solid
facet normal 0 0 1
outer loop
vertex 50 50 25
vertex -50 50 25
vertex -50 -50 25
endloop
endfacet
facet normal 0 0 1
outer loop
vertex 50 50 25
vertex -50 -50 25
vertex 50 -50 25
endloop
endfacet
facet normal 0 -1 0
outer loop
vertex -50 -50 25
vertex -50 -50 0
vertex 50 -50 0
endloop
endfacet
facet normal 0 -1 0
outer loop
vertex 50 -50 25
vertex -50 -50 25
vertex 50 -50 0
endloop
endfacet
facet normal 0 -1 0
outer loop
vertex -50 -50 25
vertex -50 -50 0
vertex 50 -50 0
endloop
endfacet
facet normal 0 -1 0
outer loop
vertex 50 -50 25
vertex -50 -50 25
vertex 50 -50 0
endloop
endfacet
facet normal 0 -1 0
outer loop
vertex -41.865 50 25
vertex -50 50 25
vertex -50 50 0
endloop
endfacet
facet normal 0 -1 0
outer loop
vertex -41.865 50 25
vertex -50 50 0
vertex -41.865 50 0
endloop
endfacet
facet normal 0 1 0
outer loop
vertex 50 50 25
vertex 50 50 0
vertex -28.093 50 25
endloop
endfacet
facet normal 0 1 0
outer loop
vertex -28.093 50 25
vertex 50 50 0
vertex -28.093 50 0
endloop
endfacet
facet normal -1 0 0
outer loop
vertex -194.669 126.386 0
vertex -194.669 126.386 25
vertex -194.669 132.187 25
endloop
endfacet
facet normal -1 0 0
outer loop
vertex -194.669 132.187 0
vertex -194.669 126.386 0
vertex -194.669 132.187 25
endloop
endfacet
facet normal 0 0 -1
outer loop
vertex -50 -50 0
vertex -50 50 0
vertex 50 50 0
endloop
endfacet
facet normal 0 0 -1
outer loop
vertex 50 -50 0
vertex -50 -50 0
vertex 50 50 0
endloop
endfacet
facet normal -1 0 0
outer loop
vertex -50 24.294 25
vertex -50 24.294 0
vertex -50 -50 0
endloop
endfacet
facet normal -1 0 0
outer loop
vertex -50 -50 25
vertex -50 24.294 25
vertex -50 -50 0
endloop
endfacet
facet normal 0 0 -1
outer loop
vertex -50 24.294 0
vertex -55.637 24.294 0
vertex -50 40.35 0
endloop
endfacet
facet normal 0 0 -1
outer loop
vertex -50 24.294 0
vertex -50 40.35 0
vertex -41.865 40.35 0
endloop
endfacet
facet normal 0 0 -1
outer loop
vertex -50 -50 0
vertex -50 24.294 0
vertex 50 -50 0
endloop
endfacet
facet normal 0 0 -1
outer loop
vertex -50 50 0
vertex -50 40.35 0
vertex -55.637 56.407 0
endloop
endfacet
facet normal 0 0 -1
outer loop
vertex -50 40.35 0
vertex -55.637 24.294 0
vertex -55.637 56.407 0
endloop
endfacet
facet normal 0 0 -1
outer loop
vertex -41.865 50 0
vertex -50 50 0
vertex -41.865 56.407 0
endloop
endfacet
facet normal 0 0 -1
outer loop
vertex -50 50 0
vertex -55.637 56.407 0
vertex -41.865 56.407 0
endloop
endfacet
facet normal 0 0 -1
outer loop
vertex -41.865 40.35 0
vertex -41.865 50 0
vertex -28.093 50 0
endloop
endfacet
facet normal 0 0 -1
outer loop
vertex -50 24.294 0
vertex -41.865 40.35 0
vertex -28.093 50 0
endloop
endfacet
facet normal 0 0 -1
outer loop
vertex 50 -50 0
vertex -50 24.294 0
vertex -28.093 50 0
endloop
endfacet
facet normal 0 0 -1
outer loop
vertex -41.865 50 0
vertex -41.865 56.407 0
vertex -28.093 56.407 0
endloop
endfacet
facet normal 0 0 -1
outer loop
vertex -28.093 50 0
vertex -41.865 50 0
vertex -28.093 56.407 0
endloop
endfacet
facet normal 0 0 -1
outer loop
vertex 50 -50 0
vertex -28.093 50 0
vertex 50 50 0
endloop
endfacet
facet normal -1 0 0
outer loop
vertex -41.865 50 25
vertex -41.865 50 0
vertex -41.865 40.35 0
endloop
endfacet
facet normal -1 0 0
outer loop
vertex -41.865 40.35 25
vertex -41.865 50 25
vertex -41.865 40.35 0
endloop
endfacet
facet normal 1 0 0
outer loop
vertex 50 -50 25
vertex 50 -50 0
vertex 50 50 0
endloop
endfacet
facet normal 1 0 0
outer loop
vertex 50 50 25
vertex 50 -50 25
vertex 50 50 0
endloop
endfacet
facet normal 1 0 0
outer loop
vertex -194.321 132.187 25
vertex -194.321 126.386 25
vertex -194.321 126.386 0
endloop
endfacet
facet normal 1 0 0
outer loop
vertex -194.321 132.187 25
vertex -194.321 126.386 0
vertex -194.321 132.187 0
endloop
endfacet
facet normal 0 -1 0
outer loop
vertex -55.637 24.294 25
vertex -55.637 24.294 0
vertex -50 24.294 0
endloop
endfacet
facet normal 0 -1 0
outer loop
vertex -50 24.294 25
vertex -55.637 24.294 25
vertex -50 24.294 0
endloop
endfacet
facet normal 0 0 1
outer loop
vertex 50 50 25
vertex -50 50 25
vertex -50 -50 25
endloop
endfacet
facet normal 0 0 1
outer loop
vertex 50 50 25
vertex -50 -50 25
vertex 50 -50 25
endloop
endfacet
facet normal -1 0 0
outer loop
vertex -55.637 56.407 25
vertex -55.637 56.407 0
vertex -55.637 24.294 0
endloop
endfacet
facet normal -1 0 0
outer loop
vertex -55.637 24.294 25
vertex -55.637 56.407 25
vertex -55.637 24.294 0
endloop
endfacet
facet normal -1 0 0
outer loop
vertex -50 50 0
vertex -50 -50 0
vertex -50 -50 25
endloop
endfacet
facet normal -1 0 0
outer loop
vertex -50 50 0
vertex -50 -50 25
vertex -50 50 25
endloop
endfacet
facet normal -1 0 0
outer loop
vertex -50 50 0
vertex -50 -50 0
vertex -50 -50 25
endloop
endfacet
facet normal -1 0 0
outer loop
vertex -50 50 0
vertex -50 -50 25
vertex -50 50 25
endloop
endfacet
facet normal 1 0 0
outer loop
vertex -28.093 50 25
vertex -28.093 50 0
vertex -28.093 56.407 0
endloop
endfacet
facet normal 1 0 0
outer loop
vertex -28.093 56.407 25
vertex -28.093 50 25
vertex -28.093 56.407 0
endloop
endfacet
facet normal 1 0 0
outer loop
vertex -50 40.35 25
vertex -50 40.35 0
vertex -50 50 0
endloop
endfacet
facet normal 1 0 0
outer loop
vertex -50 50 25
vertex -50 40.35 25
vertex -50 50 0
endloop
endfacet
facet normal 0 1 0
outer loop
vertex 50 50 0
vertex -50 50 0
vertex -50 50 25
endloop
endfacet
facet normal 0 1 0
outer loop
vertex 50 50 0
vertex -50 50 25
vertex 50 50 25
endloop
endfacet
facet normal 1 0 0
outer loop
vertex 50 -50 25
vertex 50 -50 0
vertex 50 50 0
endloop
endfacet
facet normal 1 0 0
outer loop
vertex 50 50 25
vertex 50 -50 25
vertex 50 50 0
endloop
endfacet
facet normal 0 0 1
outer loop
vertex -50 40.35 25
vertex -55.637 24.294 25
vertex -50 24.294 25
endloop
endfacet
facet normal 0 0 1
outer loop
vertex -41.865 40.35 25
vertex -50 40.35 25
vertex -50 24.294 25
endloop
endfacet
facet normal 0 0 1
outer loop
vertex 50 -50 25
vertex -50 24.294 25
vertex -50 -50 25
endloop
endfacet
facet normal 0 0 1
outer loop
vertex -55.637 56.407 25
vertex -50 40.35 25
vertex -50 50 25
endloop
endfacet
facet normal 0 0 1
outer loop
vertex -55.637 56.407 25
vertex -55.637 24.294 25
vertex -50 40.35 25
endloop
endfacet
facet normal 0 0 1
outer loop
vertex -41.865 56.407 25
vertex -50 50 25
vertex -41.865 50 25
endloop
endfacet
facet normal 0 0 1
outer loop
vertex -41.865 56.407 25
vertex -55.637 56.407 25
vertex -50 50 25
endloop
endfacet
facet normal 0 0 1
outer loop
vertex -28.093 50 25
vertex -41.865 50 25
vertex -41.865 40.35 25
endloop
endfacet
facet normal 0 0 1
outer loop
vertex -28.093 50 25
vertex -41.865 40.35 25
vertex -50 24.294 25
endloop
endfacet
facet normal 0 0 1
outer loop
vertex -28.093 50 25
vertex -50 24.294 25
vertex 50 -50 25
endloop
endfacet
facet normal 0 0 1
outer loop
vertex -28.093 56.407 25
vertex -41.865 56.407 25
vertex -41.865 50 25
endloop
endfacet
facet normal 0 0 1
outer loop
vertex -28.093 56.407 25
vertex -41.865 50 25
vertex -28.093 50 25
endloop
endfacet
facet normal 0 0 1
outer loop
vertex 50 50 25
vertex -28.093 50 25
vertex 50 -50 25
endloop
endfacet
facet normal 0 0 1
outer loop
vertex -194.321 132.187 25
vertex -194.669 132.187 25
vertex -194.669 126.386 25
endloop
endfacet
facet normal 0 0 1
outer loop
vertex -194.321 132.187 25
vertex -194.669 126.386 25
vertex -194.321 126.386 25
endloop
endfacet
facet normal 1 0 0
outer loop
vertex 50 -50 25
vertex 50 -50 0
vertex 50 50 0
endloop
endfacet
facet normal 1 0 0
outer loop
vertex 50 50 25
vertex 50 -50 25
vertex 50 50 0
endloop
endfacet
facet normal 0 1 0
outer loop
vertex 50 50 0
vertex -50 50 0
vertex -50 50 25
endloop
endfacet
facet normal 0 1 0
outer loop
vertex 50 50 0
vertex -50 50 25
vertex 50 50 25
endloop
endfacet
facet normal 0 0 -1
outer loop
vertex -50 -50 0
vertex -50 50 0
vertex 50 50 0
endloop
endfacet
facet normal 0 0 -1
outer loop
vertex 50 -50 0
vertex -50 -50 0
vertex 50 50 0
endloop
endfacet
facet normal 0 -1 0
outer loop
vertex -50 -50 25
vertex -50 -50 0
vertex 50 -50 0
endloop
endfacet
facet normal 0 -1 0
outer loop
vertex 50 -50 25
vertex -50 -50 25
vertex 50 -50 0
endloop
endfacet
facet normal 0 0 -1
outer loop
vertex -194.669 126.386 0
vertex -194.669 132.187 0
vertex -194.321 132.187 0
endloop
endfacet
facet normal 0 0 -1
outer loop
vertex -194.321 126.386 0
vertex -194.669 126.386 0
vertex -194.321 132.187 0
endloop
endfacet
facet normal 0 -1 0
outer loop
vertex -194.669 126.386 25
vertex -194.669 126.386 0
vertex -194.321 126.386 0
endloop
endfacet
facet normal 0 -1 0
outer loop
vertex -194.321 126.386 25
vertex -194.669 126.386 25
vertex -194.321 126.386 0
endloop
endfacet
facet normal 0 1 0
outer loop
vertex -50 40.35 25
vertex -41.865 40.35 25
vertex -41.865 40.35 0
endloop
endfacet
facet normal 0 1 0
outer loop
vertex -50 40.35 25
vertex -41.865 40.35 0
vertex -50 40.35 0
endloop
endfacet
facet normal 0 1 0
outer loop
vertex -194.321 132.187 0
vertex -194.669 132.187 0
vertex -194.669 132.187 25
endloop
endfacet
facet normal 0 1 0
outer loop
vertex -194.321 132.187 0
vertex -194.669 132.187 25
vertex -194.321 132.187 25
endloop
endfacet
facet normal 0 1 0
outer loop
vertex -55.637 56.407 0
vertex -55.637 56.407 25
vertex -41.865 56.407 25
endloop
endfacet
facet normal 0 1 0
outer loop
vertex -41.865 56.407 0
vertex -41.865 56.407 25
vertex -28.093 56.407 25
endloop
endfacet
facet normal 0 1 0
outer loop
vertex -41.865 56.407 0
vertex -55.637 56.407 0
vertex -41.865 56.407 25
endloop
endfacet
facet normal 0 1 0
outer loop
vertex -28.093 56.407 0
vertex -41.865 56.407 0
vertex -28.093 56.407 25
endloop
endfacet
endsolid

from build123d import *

# Parameters (mm, degrees)
F2_W     = 0.348
F2_H     = 5.8009624481
F3_DEPTH = 25
F2_W_2   = 5.63653633
F2_H_2   = 16.0566493869
F2_W_3   = 13.7717649341
F2_H_3   = 6.4069338143
F0_W     = 100
F0_H     = 100
F1_W     = 100
F1_H     = 100


with BuildPart() as f3:
    # F2 (on face) → F3 (new body)
    with BuildSketch(Plane.XY):
        with Locations((-194.4951125631, 129.2866021395)):
            Rectangle(F2_W, F2_H)
    extrude(amount=F3_DEPTH)


with BuildPart() as f3b:
    # F2 (on face) → F3, piece 2 (new body)
    with BuildSketch(Plane.XY):
        Polygon((-28.0930064619, 24.2936350405), (-50, 24.2936350405), (-50, -50), (50, -50), (50, 50), (-28.0930064619, 50), align=None)
        with Locations((-52.818268165, 32.321959734)):
            Rectangle(F2_W_2, F2_H_2)
        with Locations((-34.9788889289, 53.2034669071)):
            Rectangle(F2_W_3, F2_H_3)
        Polygon((-55.63653633, 40.3502844274), (-50, 40.3502844274), (-50, 50), (-41.8647713959, 50), (-41.8647713959, 56.4069338143), (-55.63653633, 56.4069338143), align=None)
        Polygon((-41.8647713959, 50), (-41.8647713959, 40.3502844274), (-50, 40.3502844274), (-50, 24.2936350405), (-28.0930064619, 24.2936350405), (-28.0930064619, 50), align=None)
    extrude(amount=F3_DEPTH)


with BuildPart() as f3c:
    # F0 (on Top) → F3, piece 3 (new body)
    with BuildSketch(Plane.XY):
        Rectangle(F0_W, F0_H)
    extrude(amount=F3_DEPTH)


with BuildPart() as f3d:
    # F1 (on face) → F3, piece 4 (new body)
    with BuildSketch(Plane.XY):
        Rectangle(F1_W, F1_H)
    extrude(amount=F3_DEPTH)


solid = Compound([f3.part, f3b.part, f3c.part, f3d.part])
